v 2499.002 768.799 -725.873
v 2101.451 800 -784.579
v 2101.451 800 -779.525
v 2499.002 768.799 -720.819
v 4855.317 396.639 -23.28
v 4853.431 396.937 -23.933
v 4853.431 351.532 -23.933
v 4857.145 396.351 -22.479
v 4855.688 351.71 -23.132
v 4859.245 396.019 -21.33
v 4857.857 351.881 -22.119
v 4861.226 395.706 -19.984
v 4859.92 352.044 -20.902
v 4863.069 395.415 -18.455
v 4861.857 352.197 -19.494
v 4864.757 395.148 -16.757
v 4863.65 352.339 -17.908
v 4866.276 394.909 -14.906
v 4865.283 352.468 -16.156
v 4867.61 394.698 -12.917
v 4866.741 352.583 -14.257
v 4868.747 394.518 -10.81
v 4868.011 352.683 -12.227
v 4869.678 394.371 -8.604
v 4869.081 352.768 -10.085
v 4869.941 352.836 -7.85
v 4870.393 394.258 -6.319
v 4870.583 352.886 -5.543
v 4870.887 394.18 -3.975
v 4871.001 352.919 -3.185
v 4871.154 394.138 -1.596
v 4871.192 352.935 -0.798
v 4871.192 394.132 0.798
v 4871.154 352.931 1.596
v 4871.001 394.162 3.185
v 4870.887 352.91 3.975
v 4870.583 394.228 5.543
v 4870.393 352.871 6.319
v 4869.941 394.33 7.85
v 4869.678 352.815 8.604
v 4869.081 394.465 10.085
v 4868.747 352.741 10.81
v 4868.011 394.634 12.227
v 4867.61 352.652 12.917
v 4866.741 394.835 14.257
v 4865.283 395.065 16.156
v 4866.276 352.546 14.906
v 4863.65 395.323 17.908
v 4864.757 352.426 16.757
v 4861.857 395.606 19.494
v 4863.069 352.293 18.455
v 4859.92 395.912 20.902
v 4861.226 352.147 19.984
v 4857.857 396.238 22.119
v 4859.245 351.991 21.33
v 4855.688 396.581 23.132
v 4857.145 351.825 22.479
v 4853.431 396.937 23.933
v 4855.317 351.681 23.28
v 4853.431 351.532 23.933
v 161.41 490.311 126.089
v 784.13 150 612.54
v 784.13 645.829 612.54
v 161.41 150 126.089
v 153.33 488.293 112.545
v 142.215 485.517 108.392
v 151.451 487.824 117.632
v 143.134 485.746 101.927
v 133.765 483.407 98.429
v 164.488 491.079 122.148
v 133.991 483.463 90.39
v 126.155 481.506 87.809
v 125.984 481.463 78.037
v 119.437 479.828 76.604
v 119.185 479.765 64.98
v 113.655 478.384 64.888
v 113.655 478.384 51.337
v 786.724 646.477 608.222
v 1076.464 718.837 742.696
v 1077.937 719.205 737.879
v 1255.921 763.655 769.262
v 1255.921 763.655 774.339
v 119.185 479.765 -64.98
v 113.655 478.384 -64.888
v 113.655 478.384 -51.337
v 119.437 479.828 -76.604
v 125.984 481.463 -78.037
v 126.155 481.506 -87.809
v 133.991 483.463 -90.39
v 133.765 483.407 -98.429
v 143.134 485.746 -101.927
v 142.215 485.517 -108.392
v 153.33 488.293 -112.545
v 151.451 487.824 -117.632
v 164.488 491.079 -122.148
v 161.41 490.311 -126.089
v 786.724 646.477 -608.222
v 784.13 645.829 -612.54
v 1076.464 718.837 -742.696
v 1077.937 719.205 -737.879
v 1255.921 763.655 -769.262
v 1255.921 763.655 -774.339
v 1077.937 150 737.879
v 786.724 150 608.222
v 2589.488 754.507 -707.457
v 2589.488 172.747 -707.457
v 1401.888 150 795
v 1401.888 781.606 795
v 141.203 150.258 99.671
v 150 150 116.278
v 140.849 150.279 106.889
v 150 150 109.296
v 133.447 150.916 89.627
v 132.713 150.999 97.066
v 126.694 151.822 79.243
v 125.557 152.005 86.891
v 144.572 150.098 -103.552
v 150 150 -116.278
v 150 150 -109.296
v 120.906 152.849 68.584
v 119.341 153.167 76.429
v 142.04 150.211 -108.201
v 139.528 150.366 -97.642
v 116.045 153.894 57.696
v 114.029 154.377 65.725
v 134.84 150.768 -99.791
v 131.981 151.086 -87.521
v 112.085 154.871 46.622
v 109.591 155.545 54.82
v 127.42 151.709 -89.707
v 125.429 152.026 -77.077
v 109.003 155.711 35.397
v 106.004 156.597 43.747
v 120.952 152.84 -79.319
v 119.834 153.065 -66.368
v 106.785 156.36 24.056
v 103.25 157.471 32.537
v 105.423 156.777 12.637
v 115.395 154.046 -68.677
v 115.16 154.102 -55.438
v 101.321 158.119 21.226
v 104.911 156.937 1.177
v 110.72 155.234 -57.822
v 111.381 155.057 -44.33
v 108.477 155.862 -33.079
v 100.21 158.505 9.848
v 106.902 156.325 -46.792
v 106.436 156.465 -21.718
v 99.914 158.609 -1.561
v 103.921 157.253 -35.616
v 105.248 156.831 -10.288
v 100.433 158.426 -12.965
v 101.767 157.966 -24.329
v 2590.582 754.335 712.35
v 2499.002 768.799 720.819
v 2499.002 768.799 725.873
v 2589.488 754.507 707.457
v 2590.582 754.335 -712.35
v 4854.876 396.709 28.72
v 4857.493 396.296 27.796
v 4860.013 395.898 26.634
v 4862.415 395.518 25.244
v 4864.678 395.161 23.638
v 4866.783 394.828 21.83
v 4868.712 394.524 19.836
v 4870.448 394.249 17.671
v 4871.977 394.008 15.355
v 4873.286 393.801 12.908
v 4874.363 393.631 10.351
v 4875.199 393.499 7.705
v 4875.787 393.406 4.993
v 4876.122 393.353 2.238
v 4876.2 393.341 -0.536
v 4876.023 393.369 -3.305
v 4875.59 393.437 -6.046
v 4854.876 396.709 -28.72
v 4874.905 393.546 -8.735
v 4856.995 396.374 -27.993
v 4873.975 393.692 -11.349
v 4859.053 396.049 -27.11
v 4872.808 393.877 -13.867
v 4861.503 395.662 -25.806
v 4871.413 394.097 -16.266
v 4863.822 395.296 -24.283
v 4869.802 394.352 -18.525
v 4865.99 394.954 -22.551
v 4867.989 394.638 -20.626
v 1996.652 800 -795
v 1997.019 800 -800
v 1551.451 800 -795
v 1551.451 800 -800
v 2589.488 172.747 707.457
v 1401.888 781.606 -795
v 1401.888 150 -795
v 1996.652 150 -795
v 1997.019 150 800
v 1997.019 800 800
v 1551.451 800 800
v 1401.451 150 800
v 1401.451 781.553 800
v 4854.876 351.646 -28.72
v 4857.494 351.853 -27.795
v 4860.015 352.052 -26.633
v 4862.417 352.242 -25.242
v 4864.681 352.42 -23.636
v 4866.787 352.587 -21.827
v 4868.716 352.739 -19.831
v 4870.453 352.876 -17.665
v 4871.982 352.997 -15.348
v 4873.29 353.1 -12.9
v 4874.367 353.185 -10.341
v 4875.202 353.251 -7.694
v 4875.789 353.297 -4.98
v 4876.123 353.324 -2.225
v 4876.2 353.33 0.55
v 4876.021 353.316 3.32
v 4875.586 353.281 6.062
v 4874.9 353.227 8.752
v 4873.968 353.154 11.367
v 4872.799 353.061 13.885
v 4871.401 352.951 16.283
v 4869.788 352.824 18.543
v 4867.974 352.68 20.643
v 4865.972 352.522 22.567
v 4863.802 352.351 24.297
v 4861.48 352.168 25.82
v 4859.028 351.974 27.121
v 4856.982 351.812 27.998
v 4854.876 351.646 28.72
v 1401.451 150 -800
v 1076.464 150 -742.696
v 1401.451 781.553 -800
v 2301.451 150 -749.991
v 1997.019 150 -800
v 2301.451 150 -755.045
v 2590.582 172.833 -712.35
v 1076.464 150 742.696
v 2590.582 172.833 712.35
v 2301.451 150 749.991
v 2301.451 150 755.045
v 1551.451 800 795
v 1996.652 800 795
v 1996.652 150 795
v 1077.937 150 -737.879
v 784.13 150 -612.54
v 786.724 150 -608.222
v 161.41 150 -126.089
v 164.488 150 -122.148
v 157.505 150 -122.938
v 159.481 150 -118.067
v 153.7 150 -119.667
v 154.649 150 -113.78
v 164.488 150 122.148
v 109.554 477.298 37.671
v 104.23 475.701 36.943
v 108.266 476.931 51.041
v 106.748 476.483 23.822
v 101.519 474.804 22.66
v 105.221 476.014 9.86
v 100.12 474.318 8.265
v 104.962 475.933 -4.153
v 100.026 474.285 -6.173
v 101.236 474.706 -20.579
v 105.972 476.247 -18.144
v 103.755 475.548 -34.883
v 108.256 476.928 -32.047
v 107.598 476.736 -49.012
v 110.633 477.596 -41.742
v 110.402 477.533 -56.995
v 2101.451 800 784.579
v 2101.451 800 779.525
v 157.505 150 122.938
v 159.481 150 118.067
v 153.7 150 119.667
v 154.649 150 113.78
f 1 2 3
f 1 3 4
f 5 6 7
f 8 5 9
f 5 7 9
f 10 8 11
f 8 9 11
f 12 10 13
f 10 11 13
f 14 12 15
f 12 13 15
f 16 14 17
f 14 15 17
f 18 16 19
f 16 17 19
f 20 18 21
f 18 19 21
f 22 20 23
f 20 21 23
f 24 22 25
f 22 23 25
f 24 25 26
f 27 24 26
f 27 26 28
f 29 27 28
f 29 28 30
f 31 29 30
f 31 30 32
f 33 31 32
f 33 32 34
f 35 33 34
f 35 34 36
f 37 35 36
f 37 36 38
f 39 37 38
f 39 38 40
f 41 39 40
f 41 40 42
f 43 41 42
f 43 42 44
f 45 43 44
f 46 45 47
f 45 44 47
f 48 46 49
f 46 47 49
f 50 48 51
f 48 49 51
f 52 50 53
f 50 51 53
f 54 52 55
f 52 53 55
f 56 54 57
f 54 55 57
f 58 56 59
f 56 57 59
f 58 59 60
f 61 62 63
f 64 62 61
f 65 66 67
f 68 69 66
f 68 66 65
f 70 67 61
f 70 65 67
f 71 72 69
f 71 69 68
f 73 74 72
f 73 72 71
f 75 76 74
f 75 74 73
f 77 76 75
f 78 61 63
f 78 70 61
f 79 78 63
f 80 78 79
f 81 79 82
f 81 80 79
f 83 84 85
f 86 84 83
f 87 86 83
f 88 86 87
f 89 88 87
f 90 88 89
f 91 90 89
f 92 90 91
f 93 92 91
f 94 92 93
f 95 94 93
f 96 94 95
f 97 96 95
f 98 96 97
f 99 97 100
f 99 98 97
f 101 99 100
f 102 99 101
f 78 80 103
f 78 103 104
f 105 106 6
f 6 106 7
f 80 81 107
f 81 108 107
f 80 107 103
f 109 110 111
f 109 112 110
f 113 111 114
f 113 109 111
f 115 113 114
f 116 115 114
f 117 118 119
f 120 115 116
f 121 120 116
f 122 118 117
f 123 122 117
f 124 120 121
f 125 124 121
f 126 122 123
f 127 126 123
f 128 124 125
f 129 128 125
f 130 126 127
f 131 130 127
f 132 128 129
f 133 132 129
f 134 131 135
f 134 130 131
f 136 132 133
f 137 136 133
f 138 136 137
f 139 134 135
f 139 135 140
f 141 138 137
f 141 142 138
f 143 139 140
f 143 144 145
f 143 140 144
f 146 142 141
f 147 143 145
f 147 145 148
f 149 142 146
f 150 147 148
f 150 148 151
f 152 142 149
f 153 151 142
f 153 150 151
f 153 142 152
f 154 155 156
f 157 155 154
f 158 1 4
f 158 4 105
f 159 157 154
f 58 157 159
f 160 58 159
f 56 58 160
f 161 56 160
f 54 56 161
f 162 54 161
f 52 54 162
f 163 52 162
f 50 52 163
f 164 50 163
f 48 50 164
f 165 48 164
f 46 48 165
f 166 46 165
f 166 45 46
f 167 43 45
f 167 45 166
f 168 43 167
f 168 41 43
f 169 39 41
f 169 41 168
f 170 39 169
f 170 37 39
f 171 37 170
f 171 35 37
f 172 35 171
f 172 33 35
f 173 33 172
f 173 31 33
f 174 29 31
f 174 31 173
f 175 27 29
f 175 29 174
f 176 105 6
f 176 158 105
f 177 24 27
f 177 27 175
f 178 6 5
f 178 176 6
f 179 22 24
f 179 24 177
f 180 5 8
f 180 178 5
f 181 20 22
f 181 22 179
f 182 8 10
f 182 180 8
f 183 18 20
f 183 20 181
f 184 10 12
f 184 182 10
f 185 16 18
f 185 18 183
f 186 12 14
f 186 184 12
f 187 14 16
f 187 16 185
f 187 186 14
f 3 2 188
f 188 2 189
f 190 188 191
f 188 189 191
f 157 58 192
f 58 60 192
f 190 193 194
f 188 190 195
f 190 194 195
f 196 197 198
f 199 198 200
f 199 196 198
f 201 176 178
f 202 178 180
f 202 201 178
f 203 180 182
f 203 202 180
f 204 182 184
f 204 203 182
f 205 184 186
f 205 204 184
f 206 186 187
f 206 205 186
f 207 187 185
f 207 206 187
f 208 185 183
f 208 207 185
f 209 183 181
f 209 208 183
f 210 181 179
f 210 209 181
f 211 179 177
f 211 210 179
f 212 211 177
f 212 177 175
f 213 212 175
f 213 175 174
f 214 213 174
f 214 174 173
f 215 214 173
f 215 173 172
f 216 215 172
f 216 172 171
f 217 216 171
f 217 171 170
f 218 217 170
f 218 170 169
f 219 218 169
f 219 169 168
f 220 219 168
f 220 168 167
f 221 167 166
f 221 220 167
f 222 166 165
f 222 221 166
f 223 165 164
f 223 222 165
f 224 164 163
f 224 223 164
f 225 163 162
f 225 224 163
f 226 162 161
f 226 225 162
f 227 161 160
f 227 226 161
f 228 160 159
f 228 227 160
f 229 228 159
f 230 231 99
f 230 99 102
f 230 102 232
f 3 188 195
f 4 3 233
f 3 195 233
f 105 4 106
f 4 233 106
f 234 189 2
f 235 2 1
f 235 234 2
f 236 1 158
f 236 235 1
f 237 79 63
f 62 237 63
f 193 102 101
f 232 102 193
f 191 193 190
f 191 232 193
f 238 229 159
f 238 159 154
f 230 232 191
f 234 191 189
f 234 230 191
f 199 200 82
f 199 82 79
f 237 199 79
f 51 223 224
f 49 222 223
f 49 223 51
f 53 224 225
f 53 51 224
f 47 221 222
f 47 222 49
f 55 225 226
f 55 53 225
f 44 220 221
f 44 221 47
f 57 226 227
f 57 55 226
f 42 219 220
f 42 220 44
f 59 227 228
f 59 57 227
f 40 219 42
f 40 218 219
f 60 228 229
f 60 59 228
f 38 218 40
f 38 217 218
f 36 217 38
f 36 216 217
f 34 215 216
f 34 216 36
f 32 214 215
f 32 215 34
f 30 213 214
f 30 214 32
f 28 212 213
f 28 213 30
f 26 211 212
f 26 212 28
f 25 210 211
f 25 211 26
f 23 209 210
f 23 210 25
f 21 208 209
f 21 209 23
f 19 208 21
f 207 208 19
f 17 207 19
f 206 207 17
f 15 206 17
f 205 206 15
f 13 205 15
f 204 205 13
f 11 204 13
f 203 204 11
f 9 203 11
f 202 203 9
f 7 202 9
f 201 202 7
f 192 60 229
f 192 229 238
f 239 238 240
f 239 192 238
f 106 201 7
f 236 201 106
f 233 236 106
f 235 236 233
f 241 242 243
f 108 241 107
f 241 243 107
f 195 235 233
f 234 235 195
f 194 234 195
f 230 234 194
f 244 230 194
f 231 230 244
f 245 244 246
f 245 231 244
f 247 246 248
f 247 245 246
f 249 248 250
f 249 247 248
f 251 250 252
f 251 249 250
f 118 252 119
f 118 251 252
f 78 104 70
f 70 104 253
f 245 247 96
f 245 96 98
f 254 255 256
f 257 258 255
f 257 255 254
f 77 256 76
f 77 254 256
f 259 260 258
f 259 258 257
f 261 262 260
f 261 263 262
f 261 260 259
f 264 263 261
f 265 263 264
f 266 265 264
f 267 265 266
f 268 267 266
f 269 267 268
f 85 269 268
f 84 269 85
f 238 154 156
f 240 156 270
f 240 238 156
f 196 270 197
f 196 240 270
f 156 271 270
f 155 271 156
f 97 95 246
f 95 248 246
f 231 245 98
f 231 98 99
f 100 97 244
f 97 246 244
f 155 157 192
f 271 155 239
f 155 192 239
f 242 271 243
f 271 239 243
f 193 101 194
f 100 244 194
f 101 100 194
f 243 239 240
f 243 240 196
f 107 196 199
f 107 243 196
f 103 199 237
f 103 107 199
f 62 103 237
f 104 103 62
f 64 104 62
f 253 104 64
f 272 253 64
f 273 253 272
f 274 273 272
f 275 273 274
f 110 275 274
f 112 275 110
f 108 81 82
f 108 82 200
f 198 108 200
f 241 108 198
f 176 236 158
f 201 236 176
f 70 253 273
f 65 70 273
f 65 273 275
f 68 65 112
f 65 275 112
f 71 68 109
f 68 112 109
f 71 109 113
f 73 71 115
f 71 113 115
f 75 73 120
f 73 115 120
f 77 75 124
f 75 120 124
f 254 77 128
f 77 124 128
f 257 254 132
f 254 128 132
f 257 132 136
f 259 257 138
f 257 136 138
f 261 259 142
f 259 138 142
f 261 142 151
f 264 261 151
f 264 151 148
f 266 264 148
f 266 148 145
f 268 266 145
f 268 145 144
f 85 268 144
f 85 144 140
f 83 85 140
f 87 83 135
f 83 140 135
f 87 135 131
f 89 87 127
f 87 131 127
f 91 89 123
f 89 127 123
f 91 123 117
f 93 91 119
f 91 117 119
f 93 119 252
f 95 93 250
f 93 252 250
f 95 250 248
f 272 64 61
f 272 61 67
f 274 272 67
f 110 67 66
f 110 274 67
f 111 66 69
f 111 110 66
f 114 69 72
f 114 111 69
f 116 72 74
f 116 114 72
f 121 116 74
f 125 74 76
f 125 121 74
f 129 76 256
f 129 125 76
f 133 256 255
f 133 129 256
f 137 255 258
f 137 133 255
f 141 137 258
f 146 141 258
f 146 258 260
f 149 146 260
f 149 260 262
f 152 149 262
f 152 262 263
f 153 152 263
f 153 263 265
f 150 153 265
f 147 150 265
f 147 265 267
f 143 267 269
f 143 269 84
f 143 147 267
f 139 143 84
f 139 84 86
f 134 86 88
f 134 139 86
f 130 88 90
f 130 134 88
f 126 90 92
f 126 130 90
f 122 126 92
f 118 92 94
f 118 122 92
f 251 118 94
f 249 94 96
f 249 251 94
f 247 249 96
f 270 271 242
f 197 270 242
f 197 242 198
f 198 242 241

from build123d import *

# Parameters (mm, degrees)
TOPVIEW_EXTRUDE_DEPTH      = 800
SHELL1_T                   = -5
SIDEPROFILE_CUT_DEPTH      = 5006.734380578
SIDEPROFILE_CUT_DEPTH_BACK = 5006.734380578
SKETCH2_OUTSIDE_W          = 5798.358
SKETCH2_OUTSIDE_H          = 1822.06


with BuildPart() as part:
    # Sketch1 → TopView_Extrude (new body)
    with BuildSketch(Plane(origin=(0, 0, 0), x_dir=(1, 0, 0), z_dir=(0, 1, 0))):
        with BuildLine():
            Line((161.409759475, 126.088702216), (784.13, 612.54))
            Line((784.13, 612.54), (1076.464, 742.696))
            Line((1076.464, 742.696), (1401.451, 800))
            Line((1401.451, 800), (1997.019, 800))
            Line((1997.019, 800), (2590.582, 712.35))
            Line((2590.582, 712.35), (4854.876103105, 28.719585912))
            ThreePointArc((4854.876103105, 28.719585912), (4876.205152462, 0), (4854.876103105, -28.719585912))
            Line((4854.876103105, -28.719585912), (2590.582, -712.35))
            Line((2590.582, -712.35), (1997.019, -800))
            Line((1997.019, -800), (1401.451, -800))
            Line((1401.451, -800), (1076.464, -742.696))
            Line((1076.464, -742.696), (784.13, -612.54))
            Line((784.13, -612.54), (161.409759475, -126.088702216))
            ThreePointArc((161.409759475, -126.088702216), (99.906658784, 0), (161.409759475, 126.088702216))
        make_face()
    extrude(amount=TOPVIEW_EXTRUDE_DEPTH)

    # Shell1
    shell1_openings = [part.faces().sort_by_distance(p)[0] for p in [
        (2160.780992179, 0, 0),
        (2160.780992179, 800, 0),
    ]]
    offset(amount=SHELL1_T, openings=shell1_openings, kind=Kind.INTERSECTION)

    # Sketch2 outside → SideProfile_Cut (cut, two sides: drawn at the far end of the back side and taken through both)
    with BuildSketch(Plane.XY.offset(-SIDEPROFILE_CUT_DEPTH_BACK)):
        with Locations((2488.056, 400)):
            Rectangle(SKETCH2_OUTSIDE_W, SKETCH2_OUTSIDE_H)
        with BuildLine():
            Line((0, 300), (0, 332.854109989))
            ThreePointArc((0, 332.854109989), (31.780435884, 425.180350356), (113.655128803, 478.384348558))
            Line((113.655128803, 478.384348558), (1255.921, 763.655))
            Line((1255.921, 763.655), (1551.451, 800))
            Line((1551.451, 800), (2101.451, 800))
            Line((2101.451, 800), (2499.002, 768.799))
            Line((2499.002, 768.799), (4950, 381.685))
            Line((4950, 381.685), (4950, 359.158))
            Line((4950, 359.158), (2301.451, 150))
            Line((2301.451, 150), (150, 150))
            ThreePointArc((150, 150), (43.933982822, 193.933982822), (0, 300))
        make_face(mode=Mode.SUBTRACT)
    extrude(amount=SIDEPROFILE_CUT_DEPTH + SIDEPROFILE_CUT_DEPTH_BACK, mode=Mode.SUBTRACT)


solid = part.part
